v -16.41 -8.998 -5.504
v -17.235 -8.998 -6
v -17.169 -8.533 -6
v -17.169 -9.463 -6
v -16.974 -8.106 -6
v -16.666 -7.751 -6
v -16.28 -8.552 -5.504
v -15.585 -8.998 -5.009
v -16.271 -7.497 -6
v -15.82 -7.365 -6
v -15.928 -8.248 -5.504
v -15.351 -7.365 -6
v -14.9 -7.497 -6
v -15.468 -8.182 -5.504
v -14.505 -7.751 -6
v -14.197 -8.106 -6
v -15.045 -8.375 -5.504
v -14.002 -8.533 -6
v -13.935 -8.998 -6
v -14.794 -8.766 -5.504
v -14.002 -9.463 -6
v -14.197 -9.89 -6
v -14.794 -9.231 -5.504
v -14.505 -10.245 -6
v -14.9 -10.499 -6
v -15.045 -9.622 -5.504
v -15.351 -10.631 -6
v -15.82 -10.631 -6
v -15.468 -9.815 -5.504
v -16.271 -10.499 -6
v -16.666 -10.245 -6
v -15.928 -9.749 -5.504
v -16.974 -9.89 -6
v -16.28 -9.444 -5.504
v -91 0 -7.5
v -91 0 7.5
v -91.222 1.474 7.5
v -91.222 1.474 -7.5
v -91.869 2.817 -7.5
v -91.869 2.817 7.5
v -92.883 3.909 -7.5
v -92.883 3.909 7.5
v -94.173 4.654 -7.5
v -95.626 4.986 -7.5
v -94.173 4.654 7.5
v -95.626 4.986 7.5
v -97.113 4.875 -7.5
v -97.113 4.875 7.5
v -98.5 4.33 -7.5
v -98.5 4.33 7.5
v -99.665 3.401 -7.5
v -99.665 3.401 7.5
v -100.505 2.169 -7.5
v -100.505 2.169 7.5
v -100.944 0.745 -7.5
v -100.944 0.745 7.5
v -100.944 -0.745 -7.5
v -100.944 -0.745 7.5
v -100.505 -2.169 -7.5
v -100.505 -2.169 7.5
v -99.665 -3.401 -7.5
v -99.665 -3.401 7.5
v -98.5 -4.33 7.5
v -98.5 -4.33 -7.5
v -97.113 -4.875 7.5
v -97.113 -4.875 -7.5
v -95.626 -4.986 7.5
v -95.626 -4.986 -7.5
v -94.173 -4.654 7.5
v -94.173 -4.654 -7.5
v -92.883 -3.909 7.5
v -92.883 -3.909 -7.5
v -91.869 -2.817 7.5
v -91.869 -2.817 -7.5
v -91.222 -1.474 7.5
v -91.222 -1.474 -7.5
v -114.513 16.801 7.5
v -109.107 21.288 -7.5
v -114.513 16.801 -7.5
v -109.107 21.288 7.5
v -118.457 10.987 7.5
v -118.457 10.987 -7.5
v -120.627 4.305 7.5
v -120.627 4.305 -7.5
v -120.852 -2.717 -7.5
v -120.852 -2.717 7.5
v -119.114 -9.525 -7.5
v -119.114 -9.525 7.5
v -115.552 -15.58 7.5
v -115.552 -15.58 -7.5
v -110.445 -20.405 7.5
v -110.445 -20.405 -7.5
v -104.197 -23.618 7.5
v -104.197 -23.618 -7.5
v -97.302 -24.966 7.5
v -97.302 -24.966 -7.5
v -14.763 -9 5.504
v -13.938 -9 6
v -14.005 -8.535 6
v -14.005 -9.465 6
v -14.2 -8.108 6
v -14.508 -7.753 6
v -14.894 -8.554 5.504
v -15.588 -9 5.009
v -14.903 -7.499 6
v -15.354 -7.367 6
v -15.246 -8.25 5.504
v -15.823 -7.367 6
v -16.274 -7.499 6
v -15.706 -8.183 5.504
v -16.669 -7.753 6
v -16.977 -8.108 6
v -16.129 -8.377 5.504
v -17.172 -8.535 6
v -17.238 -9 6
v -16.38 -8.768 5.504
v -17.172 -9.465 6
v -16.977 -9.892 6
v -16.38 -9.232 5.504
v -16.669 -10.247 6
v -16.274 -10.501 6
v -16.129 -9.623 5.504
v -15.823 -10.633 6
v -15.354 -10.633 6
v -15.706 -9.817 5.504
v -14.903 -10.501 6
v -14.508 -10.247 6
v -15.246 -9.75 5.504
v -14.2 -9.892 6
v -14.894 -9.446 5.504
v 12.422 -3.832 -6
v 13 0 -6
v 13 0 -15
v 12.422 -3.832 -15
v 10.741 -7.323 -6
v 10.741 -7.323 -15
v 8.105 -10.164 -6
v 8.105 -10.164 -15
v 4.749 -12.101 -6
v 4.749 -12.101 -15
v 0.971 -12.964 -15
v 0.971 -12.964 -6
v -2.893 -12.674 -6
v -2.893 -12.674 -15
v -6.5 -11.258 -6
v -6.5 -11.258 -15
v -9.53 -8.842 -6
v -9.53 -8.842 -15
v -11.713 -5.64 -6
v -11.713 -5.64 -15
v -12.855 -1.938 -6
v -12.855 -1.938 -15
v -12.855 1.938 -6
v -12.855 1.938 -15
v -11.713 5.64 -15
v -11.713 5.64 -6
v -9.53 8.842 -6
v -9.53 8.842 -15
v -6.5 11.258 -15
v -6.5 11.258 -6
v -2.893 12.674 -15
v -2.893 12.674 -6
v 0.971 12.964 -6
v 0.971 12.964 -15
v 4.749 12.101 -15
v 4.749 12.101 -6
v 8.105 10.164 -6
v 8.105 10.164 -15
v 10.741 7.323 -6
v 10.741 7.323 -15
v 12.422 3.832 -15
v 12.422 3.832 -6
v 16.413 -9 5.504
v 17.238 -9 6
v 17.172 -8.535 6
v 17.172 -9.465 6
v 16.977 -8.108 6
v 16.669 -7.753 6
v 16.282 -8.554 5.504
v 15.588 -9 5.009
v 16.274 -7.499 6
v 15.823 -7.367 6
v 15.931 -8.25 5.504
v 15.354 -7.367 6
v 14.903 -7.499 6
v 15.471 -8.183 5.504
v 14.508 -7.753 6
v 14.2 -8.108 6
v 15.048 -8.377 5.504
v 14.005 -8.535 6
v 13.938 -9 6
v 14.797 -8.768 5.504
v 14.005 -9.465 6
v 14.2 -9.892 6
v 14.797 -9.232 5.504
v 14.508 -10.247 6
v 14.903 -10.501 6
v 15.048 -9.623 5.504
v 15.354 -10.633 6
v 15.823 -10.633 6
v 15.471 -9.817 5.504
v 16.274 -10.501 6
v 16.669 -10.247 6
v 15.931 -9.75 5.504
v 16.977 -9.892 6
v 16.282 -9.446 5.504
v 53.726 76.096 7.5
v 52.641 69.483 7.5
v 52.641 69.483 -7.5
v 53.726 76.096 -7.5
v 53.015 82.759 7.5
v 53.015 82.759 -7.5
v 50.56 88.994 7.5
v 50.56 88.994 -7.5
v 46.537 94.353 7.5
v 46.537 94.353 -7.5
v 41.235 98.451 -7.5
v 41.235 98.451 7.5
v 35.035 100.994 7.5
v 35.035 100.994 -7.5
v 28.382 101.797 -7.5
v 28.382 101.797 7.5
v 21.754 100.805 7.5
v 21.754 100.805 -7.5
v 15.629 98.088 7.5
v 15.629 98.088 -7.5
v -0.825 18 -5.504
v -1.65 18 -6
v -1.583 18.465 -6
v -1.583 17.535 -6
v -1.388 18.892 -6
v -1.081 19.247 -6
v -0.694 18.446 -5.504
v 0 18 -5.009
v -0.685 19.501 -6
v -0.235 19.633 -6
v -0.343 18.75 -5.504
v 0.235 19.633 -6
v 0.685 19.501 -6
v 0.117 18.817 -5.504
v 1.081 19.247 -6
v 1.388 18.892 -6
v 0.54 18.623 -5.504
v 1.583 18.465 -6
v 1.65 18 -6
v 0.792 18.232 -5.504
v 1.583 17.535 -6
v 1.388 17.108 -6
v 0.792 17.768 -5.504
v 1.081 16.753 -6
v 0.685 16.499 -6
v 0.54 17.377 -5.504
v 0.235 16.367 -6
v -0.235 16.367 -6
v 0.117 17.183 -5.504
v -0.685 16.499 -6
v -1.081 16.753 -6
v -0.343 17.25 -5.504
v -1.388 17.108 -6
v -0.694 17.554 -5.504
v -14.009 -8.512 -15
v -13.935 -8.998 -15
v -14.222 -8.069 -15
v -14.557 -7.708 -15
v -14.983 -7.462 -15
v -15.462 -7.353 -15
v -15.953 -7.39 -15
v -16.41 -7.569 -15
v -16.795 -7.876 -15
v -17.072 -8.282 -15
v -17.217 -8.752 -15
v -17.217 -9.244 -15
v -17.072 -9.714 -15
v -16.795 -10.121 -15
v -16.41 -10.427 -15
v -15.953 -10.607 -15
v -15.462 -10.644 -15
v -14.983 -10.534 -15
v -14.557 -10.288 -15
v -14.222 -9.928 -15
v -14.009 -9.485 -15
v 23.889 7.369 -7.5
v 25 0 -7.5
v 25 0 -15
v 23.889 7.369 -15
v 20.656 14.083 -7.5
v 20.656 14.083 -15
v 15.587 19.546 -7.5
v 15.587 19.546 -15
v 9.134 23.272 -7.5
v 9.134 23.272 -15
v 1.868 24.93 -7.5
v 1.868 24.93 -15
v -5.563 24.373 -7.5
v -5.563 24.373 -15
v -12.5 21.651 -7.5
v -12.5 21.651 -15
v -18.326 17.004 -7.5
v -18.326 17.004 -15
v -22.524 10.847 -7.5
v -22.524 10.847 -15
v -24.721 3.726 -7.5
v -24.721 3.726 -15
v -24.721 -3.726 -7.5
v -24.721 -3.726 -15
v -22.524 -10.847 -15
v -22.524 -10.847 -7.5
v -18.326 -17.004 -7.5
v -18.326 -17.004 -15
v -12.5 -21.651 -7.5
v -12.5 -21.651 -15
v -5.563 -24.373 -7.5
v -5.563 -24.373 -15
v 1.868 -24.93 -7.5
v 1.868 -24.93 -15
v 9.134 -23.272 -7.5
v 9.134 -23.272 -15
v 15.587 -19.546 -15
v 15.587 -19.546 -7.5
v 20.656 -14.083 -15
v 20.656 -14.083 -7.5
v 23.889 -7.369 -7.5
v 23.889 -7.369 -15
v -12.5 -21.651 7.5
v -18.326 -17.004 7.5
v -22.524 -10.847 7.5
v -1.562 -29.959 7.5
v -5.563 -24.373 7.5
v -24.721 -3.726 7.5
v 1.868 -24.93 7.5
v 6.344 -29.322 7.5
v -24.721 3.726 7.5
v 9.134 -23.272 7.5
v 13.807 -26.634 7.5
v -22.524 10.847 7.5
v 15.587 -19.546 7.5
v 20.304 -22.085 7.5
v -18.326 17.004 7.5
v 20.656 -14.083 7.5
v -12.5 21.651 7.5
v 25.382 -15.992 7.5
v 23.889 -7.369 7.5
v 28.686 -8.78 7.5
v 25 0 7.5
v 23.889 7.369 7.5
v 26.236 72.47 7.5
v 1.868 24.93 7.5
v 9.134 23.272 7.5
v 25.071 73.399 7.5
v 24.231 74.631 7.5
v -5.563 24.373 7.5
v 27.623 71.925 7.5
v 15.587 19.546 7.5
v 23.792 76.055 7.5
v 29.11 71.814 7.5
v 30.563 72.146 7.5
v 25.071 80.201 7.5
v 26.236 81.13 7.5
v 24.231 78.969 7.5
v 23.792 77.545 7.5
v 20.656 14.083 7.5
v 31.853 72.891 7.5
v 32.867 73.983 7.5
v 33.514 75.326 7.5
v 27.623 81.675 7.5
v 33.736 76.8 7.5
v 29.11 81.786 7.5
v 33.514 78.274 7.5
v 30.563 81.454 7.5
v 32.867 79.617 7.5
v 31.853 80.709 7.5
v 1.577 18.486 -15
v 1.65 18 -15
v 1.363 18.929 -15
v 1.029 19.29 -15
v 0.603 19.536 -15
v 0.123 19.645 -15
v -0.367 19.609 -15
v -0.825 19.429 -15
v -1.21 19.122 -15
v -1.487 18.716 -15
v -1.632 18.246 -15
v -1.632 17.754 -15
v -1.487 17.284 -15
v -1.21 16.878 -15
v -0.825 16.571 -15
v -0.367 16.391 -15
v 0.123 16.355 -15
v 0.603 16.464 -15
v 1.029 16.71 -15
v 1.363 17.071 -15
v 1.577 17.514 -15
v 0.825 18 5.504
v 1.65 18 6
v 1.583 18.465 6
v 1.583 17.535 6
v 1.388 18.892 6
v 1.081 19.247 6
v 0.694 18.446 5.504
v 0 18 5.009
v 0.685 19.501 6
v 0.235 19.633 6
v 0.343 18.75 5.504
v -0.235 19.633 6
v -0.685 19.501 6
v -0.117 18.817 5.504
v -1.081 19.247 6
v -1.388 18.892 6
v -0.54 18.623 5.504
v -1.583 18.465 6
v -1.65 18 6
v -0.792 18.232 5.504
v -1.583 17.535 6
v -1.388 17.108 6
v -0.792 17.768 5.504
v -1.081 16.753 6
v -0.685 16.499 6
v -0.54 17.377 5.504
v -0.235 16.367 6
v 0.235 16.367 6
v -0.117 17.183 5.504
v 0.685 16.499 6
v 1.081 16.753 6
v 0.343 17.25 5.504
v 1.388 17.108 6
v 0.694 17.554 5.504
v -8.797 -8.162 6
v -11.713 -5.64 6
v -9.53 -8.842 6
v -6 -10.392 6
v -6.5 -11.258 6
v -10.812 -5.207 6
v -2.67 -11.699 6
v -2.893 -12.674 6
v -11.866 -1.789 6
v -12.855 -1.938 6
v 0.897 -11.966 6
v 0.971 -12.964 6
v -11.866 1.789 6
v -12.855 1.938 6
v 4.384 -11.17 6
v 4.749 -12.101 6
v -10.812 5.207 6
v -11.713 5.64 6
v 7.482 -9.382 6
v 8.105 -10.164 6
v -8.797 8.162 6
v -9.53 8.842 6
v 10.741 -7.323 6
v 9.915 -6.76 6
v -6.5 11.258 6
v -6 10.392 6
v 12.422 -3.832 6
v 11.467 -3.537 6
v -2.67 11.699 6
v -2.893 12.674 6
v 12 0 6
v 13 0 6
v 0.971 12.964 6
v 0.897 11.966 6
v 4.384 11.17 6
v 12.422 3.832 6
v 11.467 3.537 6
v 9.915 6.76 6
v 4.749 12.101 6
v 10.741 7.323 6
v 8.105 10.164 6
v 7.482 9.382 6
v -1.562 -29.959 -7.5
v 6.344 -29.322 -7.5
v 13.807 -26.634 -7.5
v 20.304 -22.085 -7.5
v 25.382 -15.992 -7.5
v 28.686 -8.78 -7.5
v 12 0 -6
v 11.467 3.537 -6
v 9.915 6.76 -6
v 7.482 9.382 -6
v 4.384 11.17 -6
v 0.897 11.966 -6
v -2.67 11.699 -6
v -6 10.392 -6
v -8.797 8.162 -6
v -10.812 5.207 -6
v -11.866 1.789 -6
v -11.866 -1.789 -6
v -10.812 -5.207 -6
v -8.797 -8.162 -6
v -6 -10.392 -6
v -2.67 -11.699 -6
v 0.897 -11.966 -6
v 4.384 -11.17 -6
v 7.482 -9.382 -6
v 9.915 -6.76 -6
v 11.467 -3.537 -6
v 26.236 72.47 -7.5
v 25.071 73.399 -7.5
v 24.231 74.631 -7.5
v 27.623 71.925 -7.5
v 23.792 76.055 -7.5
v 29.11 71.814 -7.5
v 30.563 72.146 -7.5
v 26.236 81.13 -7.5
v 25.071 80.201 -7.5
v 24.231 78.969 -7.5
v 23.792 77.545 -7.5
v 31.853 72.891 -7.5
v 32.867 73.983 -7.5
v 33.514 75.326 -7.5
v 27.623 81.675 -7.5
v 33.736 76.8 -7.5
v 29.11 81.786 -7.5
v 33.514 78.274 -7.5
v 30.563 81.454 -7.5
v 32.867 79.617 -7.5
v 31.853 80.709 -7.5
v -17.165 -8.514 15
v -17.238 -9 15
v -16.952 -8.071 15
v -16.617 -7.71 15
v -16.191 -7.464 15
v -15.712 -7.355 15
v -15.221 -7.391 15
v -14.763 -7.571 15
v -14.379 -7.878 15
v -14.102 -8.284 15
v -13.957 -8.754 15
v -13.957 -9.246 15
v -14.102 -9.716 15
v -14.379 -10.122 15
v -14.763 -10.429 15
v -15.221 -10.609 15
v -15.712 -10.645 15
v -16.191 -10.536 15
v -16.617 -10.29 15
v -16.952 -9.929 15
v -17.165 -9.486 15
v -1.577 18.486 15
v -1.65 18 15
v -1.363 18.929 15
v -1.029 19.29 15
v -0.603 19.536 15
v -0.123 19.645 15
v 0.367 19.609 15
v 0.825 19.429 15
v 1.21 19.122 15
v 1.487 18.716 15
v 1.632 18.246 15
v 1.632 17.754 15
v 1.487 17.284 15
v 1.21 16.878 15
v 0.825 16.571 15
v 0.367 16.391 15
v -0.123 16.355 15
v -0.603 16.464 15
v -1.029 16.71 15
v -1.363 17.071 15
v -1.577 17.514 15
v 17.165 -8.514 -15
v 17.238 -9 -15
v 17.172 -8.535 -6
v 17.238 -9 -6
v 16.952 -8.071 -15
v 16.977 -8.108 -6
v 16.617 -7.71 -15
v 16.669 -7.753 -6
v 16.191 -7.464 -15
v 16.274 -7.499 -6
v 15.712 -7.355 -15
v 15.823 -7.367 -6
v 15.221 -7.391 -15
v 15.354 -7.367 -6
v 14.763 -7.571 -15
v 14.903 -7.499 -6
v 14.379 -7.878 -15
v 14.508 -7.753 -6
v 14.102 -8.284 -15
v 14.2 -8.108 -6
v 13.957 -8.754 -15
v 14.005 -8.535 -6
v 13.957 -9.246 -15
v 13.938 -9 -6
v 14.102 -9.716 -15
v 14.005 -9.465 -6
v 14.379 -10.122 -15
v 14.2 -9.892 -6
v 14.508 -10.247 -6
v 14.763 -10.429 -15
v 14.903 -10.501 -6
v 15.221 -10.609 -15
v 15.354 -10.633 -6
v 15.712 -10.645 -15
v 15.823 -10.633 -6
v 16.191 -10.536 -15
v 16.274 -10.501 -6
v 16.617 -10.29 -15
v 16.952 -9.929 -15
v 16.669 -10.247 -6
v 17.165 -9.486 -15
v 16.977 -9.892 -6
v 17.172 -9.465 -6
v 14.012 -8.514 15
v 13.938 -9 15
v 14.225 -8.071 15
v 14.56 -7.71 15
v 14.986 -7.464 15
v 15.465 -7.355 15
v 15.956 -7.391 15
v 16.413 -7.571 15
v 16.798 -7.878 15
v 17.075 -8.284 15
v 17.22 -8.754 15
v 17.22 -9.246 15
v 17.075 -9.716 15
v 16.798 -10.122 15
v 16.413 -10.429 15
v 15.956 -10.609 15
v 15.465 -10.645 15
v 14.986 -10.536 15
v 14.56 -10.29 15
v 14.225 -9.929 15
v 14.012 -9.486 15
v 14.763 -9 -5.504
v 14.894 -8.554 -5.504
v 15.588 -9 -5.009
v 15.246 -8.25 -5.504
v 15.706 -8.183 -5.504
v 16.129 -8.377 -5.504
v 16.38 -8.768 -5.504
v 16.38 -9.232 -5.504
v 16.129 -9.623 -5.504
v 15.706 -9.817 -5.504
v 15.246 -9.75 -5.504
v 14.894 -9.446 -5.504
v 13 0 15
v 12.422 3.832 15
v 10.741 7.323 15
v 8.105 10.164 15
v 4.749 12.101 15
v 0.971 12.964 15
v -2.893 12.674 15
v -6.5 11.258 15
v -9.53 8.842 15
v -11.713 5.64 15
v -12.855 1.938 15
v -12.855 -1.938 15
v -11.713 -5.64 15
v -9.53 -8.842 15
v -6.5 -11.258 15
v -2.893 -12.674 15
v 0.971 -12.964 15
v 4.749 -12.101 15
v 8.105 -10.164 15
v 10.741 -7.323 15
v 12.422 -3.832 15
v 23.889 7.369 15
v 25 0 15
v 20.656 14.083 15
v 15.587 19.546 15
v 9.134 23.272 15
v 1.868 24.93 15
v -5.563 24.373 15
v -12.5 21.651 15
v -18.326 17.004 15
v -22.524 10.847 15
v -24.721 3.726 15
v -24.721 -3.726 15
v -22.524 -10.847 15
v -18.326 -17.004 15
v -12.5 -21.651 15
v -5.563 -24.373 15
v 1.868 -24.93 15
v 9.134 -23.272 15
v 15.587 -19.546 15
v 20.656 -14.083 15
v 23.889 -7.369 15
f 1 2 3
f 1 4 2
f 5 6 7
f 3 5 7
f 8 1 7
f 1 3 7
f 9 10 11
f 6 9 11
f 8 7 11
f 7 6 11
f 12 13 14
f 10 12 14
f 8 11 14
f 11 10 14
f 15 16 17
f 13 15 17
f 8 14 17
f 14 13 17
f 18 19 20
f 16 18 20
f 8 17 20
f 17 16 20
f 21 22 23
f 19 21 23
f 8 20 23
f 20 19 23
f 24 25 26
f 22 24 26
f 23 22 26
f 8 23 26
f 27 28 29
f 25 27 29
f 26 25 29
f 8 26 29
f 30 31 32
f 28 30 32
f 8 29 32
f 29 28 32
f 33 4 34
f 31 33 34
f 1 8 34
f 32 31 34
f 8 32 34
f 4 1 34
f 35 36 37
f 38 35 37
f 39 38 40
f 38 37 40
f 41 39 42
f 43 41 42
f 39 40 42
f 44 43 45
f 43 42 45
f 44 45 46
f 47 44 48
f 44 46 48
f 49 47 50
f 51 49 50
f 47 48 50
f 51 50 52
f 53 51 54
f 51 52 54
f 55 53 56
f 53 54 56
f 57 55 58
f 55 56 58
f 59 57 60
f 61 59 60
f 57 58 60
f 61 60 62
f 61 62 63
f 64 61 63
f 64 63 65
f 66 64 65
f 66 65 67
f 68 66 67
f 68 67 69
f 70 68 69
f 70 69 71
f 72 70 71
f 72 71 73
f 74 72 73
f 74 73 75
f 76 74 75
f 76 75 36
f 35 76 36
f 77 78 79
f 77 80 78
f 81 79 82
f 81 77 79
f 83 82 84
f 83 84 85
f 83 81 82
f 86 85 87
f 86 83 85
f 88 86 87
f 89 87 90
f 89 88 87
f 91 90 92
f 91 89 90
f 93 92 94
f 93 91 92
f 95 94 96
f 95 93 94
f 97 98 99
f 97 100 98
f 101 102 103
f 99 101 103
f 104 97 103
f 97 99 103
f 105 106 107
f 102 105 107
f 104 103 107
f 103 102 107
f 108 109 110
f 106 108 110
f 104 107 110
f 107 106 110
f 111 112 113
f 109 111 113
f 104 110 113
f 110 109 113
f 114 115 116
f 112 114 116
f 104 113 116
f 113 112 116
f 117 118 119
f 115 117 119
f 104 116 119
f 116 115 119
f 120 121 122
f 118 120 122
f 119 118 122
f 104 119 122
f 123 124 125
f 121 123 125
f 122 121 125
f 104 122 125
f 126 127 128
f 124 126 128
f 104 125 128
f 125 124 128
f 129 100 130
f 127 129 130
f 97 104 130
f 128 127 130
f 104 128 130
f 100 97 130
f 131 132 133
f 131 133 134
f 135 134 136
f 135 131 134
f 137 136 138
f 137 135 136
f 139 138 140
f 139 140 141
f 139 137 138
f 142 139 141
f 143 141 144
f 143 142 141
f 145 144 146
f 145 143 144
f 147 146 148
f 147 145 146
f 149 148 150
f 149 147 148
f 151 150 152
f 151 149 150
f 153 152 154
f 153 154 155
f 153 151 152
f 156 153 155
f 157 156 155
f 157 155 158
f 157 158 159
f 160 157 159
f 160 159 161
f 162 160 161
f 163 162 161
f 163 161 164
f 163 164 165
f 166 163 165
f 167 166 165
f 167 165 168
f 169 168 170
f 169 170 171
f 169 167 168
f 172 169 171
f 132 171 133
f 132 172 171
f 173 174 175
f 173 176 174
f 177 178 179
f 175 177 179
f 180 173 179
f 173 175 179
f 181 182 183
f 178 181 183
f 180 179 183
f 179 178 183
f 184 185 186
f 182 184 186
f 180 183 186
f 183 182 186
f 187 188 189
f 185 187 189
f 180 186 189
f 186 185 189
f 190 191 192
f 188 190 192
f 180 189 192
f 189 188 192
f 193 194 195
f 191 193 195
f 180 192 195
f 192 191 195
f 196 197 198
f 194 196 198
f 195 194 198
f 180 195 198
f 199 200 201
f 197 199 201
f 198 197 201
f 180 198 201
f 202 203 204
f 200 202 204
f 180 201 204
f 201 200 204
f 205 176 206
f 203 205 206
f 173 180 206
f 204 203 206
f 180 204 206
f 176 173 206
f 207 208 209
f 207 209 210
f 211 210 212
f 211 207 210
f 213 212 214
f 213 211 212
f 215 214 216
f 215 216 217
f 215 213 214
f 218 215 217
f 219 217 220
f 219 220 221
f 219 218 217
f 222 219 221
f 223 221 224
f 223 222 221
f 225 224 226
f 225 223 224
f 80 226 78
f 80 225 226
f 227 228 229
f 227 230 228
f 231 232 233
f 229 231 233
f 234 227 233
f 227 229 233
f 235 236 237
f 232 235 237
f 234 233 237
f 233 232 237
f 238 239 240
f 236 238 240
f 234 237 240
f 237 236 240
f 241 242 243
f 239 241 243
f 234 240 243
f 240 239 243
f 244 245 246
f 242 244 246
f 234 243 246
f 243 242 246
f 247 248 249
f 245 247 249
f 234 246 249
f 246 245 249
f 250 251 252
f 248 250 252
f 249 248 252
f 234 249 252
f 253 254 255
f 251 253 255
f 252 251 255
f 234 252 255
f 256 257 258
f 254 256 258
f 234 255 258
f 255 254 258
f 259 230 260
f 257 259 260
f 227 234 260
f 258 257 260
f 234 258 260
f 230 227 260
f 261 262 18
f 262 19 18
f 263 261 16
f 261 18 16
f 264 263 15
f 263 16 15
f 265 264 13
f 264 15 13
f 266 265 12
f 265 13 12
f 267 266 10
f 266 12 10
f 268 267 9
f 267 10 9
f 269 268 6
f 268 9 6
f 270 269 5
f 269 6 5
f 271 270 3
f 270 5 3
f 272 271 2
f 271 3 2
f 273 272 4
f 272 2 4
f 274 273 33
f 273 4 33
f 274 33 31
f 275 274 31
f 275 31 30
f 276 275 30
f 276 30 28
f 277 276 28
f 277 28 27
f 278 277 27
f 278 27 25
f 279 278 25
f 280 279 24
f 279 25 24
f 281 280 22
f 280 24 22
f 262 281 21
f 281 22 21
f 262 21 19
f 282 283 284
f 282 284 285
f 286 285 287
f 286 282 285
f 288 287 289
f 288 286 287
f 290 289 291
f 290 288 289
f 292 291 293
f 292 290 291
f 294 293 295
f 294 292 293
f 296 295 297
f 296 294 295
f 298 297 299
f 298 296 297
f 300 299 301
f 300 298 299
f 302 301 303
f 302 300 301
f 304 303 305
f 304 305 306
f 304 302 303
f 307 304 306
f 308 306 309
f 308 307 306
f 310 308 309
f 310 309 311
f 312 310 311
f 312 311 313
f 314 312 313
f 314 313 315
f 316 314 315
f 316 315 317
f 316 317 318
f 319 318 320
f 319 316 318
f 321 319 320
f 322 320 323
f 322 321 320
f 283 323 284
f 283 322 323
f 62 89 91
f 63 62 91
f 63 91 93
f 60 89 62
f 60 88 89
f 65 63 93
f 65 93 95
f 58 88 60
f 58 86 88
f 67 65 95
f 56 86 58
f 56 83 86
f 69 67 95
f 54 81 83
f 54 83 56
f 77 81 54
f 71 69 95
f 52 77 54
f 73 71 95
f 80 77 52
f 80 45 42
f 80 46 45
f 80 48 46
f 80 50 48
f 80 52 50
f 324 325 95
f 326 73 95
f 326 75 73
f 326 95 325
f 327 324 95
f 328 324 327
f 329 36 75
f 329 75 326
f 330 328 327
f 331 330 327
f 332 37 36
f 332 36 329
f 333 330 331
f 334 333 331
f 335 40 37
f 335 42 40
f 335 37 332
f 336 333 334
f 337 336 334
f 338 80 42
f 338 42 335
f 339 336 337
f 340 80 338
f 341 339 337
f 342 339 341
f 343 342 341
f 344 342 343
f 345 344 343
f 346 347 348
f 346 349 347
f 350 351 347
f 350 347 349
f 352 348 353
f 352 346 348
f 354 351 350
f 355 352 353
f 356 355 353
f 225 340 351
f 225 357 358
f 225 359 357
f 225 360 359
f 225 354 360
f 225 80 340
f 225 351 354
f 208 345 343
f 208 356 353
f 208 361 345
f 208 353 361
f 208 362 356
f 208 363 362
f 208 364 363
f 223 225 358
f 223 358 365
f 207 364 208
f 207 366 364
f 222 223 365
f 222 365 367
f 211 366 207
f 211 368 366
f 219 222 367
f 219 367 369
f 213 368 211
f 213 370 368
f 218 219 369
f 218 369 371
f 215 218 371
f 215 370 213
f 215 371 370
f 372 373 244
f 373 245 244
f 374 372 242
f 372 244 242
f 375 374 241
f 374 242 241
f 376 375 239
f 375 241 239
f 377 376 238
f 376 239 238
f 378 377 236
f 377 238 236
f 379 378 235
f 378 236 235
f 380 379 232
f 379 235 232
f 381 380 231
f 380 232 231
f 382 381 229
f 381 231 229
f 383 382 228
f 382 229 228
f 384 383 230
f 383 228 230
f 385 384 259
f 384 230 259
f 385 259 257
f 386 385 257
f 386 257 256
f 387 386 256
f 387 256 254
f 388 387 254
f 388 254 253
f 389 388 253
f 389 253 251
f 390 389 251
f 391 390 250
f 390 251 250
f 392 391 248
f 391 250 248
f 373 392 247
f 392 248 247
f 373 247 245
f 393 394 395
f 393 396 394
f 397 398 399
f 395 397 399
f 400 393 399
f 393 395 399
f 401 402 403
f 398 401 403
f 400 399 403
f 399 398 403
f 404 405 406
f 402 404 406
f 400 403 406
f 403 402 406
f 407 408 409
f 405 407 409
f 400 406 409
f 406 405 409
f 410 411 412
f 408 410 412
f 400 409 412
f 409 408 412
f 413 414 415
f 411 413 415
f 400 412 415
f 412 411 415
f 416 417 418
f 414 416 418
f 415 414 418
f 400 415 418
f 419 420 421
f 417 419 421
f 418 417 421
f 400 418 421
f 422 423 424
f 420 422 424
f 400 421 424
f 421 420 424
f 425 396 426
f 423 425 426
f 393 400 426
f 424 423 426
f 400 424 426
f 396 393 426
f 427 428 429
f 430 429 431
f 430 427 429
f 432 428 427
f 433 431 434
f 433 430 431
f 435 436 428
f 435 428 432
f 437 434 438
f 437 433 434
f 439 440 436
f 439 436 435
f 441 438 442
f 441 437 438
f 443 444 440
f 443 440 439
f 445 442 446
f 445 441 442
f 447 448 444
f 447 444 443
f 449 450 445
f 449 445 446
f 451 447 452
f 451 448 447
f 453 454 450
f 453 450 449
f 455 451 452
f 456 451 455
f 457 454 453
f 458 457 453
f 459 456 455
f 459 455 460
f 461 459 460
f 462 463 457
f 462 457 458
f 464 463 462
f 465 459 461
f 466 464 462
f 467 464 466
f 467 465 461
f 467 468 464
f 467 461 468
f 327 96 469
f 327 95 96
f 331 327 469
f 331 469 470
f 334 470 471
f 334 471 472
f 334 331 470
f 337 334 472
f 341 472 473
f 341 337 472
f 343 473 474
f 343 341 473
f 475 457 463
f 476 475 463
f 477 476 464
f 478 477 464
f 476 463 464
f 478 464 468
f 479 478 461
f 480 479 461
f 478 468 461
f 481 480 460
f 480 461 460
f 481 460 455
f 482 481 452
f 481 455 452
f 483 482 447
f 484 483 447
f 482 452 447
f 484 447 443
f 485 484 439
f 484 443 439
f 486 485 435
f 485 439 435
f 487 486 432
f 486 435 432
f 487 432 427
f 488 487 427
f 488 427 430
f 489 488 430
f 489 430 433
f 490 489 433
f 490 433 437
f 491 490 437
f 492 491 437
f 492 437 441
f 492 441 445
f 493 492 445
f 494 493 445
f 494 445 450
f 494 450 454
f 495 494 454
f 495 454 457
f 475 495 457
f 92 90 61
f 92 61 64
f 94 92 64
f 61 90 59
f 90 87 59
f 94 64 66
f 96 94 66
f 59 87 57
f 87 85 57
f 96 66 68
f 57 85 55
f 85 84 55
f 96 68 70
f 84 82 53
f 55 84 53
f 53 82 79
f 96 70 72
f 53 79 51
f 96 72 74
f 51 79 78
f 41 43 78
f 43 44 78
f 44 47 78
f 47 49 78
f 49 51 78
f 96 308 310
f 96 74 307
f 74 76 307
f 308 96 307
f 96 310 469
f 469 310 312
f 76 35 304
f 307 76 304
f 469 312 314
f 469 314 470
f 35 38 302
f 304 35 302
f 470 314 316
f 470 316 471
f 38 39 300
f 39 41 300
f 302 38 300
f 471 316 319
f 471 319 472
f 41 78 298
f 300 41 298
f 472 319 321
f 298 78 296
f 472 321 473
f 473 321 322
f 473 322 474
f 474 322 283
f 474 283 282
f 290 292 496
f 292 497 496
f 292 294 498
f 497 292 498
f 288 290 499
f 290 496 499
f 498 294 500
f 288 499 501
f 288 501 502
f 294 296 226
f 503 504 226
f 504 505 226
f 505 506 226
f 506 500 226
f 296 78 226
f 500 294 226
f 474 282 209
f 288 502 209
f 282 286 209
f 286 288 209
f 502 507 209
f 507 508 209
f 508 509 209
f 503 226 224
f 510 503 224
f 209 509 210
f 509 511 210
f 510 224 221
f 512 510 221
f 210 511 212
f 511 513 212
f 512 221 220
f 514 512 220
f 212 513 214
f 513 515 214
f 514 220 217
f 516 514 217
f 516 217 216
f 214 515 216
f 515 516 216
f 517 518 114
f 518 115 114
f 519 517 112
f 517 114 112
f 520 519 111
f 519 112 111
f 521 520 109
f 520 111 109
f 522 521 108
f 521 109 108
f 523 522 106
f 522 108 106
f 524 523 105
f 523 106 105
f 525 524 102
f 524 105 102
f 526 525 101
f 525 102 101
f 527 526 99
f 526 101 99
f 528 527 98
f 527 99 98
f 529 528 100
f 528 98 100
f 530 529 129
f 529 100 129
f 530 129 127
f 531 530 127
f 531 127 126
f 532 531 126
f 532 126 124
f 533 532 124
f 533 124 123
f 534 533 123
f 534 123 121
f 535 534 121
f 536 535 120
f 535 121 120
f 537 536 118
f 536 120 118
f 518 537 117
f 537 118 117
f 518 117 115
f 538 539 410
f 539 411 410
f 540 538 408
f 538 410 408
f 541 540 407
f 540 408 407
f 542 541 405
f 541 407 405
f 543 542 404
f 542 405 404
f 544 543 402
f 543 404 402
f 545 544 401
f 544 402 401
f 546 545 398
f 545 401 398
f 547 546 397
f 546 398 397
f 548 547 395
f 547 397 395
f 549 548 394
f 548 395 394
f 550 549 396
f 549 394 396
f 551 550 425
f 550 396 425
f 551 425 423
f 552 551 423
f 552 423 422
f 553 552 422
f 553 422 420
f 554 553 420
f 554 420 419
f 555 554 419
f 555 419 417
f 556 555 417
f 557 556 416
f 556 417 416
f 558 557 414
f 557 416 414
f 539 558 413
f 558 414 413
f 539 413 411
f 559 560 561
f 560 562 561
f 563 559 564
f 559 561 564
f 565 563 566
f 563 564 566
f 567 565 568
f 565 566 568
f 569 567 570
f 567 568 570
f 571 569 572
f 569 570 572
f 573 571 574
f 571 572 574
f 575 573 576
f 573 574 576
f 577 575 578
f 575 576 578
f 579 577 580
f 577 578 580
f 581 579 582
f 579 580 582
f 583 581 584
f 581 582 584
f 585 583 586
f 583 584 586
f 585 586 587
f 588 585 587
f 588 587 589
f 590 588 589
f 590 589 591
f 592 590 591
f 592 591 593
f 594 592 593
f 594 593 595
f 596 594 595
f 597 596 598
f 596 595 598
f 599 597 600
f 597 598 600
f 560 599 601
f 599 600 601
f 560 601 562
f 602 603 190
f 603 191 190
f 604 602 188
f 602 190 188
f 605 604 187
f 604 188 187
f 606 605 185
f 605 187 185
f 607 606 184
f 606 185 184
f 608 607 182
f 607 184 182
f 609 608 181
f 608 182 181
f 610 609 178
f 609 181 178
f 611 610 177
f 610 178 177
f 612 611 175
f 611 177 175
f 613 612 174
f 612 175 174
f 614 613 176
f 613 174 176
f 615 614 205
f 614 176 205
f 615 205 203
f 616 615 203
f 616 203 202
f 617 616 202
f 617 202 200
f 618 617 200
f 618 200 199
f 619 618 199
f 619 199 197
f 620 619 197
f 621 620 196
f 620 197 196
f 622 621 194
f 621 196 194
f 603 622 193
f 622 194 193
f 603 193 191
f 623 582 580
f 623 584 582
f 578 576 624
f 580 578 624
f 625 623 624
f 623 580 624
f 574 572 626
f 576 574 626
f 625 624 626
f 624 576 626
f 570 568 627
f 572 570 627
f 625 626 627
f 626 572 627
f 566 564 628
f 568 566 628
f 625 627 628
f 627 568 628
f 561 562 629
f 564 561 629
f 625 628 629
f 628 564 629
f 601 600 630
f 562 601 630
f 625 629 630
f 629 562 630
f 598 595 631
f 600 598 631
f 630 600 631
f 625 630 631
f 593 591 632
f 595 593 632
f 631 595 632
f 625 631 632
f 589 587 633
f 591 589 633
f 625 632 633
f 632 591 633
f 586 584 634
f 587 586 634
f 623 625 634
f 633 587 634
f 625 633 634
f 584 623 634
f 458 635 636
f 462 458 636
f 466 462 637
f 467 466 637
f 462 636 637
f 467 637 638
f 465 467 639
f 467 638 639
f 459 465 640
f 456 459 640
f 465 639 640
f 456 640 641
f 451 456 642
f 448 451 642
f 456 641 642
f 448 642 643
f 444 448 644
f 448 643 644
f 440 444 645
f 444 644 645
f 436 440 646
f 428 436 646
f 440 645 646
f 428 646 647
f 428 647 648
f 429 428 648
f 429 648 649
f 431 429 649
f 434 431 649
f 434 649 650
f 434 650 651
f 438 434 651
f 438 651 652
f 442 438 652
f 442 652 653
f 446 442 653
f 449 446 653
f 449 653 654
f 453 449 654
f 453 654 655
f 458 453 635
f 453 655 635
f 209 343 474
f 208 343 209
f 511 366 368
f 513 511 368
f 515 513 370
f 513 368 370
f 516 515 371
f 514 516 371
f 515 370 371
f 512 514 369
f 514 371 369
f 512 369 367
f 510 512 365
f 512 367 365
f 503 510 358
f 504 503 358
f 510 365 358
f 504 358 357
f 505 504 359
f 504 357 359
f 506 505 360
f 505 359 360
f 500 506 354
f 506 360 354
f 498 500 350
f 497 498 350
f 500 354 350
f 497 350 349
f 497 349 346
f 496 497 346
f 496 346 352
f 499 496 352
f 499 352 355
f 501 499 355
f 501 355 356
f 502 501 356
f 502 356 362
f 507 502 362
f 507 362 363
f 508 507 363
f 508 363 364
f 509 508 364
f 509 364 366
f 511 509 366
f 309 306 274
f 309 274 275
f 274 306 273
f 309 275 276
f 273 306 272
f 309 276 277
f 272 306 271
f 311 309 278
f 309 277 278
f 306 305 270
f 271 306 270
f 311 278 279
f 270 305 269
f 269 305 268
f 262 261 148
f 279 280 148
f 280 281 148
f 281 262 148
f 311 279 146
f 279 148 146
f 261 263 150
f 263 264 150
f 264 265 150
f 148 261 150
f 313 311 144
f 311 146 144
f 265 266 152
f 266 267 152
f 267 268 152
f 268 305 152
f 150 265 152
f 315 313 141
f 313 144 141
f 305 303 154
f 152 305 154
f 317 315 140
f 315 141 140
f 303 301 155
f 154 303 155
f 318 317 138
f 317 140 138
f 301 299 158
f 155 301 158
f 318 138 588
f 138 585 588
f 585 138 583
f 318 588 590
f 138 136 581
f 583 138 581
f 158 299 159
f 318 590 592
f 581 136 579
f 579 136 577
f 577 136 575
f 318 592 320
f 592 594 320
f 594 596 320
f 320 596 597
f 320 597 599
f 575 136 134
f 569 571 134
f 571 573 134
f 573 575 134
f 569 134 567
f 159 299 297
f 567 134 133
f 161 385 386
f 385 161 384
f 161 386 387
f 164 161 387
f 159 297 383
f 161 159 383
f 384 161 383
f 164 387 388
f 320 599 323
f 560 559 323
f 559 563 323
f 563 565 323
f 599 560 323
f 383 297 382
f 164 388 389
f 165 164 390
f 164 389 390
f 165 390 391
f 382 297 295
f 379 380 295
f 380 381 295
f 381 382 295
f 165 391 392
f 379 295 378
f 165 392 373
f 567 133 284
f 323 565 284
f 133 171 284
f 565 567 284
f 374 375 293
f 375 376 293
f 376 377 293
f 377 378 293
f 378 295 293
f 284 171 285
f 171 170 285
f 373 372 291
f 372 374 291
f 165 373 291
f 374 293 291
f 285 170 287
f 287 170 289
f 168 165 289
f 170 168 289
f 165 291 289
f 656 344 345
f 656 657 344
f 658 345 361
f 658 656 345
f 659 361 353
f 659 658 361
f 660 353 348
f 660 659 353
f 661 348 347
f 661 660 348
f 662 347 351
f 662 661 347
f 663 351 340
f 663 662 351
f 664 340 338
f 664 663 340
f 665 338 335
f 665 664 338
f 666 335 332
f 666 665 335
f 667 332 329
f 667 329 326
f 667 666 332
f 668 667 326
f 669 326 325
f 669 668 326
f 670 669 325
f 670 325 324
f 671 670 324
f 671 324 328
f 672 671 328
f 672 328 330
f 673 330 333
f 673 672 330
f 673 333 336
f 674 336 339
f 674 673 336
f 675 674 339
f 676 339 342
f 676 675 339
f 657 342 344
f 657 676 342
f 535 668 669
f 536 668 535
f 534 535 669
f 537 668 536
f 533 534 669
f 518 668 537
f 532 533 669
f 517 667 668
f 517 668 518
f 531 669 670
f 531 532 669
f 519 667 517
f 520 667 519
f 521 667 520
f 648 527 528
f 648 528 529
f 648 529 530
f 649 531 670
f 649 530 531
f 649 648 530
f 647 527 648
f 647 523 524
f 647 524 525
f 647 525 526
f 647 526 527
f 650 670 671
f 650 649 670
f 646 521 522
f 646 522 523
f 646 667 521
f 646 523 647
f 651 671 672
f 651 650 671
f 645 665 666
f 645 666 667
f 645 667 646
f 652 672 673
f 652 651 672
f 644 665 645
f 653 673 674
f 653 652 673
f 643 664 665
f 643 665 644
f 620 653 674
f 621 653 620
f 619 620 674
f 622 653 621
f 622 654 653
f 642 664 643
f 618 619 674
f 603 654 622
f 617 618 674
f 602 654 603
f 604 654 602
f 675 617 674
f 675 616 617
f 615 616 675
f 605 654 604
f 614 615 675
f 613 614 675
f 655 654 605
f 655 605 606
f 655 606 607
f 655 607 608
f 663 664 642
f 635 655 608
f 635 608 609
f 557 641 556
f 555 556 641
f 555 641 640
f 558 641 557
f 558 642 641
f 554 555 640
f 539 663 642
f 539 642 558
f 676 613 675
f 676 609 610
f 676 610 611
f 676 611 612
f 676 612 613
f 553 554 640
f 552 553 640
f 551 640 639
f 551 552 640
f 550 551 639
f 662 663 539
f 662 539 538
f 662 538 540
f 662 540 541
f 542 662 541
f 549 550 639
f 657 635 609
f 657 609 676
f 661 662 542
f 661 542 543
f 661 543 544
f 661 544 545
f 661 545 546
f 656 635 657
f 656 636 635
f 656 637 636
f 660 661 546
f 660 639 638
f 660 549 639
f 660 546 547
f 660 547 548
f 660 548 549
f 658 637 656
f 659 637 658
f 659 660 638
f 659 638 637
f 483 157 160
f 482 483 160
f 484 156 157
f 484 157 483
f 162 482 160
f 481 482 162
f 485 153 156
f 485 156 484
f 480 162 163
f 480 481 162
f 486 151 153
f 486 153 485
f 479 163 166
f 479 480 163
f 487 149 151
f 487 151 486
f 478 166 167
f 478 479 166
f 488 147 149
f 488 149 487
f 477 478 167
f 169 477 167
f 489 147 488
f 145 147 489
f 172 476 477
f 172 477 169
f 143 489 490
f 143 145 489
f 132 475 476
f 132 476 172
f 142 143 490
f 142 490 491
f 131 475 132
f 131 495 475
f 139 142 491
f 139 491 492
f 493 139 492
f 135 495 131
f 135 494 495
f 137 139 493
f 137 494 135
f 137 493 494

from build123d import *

# Parameters (mm, degrees)
BASELINE_BODY_DEPTH   = 7.5
SKETCH3_R             = 5
CUT_EXTRUDE1_DEPTH    = 159.837149307
SKETCH4_R             = 25
BOSS_EXTRUDE2_DEPTH   = 15
SKETCH5_R             = 12
CUT_EXTRUDE2_DEPTH    = 161.947941894
SKETCH6_R             = 13
CUT_EXTRUDE3_DEPTH    = 9
CUT_EXTRUDE4_START    = -9
SKETCH7_R             = 13
CUT_EXTRUDE4_DEPTH    = 9
M4_TAPPED_HOLE6_D     = 3.3
M4_TAPPED_HOLE6_DEPTH = 9
M4_TAPPED_HOLE6_TIP   = 0.991420021
M4_TAPPED_HOLE8_D     = 3.3
M4_TAPPED_HOLE8_DEPTH = 9
M4_TAPPED_HOLE8_TIP   = 0.991420021


with BuildPart() as part:
    # Rocker_Profile → Baseline_Body (new, symmetric)
    with BuildSketch(Plane.XY):
        with BuildLine():
            Line((-97.302083333, -24.966068553), (-1.5625, -29.959282264))
            ThreePointArc((-1.5625, -29.959282264), (17.206458335, -24.57514581), (28.686326507, -8.780357142))
            Line((28.686326507, -8.780357142), (52.641312178, 69.483035715))
            ThreePointArc((52.641312178, 69.483035715), (44.023831603, 96.580885487), (15.628732451, 98.088458997))
            Line((15.628732451, 98.088458997), (-109.107307638, 21.288458997))
            ThreePointArc((-109.107307638, 21.288458997), (-120.2235003, -6.182397046), (-97.302083333, -24.966068553))
        make_face()
    extrude(amount=BASELINE_BODY_DEPTH, both=True)

    # Sketch3 → Cut-Extrude1 (cut, through all)
    with BuildSketch(Plane.XY.offset(7.5)):
        with Locations((-96, 0)):
            Circle(SKETCH3_R)
        with Locations((28.736040089, 76.8)):
            Circle(SKETCH3_R)
    extrude(amount=-CUT_EXTRUDE1_DEPTH, mode=Mode.SUBTRACT)

    # Sketch4 → Boss-Extrude2 (add, symmetric)
    with BuildSketch(Plane.XY):
        Circle(SKETCH4_R)
    extrude(amount=BOSS_EXTRUDE2_DEPTH, both=True)

    # Sketch5 → Cut-Extrude2 (cut, through all)
    with BuildSketch(Plane.XY.offset(15)):
        Circle(SKETCH5_R)
    extrude(amount=-CUT_EXTRUDE2_DEPTH, mode=Mode.SUBTRACT)

    # Sketch6 → Cut-Extrude3 (cut)
    with BuildSketch(Plane.XY.offset(15)):
        Circle(SKETCH6_R)
    extrude(amount=-CUT_EXTRUDE3_DEPTH, mode=Mode.SUBTRACT)

    # Sketch7 → Cut-Extrude4 (cut)
    with BuildSketch(Plane(origin=(0, 0, -15), x_dir=(-1, 0, 0), z_dir=(0, 0, -1)).offset(CUT_EXTRUDE4_START)):
        with Locations(Location((0, 0, 0), (0, 0, 180))):
            Circle(SKETCH7_R)
    extrude(amount=CUT_EXTRUDE4_DEPTH, mode=Mode.SUBTRACT)

    # M4 Tapped Hole6
    with Locations(Plane.XY.offset(15)):
        with Locations((-15.588457268, -9), (0, 18), (15.588457268, -9)):
            Hole(M4_TAPPED_HOLE6_D / 2, depth=M4_TAPPED_HOLE6_DEPTH)
            with Locations((0, 0, -(M4_TAPPED_HOLE6_DEPTH + M4_TAPPED_HOLE6_TIP / 2))):  # 118° drill point
                Cone(0, M4_TAPPED_HOLE6_D / 2, M4_TAPPED_HOLE6_TIP, mode=Mode.SUBTRACT)

    # M4 Tapped Hole8
    with Locations(Plane(origin=(0, 0, -15), x_dir=(-1, 0, 0), z_dir=(0, 0, -1))):
        with Locations((-15.588457268, -9), (0, 18), (15.585467422, -8.998273811)):
            Hole(M4_TAPPED_HOLE8_D / 2, depth=M4_TAPPED_HOLE8_DEPTH)
            with Locations((0, 0, -(M4_TAPPED_HOLE8_DEPTH + M4_TAPPED_HOLE8_TIP / 2))):  # 118° drill point
                Cone(0, M4_TAPPED_HOLE8_D / 2, M4_TAPPED_HOLE8_TIP, mode=Mode.SUBTRACT)


solid = part.part
